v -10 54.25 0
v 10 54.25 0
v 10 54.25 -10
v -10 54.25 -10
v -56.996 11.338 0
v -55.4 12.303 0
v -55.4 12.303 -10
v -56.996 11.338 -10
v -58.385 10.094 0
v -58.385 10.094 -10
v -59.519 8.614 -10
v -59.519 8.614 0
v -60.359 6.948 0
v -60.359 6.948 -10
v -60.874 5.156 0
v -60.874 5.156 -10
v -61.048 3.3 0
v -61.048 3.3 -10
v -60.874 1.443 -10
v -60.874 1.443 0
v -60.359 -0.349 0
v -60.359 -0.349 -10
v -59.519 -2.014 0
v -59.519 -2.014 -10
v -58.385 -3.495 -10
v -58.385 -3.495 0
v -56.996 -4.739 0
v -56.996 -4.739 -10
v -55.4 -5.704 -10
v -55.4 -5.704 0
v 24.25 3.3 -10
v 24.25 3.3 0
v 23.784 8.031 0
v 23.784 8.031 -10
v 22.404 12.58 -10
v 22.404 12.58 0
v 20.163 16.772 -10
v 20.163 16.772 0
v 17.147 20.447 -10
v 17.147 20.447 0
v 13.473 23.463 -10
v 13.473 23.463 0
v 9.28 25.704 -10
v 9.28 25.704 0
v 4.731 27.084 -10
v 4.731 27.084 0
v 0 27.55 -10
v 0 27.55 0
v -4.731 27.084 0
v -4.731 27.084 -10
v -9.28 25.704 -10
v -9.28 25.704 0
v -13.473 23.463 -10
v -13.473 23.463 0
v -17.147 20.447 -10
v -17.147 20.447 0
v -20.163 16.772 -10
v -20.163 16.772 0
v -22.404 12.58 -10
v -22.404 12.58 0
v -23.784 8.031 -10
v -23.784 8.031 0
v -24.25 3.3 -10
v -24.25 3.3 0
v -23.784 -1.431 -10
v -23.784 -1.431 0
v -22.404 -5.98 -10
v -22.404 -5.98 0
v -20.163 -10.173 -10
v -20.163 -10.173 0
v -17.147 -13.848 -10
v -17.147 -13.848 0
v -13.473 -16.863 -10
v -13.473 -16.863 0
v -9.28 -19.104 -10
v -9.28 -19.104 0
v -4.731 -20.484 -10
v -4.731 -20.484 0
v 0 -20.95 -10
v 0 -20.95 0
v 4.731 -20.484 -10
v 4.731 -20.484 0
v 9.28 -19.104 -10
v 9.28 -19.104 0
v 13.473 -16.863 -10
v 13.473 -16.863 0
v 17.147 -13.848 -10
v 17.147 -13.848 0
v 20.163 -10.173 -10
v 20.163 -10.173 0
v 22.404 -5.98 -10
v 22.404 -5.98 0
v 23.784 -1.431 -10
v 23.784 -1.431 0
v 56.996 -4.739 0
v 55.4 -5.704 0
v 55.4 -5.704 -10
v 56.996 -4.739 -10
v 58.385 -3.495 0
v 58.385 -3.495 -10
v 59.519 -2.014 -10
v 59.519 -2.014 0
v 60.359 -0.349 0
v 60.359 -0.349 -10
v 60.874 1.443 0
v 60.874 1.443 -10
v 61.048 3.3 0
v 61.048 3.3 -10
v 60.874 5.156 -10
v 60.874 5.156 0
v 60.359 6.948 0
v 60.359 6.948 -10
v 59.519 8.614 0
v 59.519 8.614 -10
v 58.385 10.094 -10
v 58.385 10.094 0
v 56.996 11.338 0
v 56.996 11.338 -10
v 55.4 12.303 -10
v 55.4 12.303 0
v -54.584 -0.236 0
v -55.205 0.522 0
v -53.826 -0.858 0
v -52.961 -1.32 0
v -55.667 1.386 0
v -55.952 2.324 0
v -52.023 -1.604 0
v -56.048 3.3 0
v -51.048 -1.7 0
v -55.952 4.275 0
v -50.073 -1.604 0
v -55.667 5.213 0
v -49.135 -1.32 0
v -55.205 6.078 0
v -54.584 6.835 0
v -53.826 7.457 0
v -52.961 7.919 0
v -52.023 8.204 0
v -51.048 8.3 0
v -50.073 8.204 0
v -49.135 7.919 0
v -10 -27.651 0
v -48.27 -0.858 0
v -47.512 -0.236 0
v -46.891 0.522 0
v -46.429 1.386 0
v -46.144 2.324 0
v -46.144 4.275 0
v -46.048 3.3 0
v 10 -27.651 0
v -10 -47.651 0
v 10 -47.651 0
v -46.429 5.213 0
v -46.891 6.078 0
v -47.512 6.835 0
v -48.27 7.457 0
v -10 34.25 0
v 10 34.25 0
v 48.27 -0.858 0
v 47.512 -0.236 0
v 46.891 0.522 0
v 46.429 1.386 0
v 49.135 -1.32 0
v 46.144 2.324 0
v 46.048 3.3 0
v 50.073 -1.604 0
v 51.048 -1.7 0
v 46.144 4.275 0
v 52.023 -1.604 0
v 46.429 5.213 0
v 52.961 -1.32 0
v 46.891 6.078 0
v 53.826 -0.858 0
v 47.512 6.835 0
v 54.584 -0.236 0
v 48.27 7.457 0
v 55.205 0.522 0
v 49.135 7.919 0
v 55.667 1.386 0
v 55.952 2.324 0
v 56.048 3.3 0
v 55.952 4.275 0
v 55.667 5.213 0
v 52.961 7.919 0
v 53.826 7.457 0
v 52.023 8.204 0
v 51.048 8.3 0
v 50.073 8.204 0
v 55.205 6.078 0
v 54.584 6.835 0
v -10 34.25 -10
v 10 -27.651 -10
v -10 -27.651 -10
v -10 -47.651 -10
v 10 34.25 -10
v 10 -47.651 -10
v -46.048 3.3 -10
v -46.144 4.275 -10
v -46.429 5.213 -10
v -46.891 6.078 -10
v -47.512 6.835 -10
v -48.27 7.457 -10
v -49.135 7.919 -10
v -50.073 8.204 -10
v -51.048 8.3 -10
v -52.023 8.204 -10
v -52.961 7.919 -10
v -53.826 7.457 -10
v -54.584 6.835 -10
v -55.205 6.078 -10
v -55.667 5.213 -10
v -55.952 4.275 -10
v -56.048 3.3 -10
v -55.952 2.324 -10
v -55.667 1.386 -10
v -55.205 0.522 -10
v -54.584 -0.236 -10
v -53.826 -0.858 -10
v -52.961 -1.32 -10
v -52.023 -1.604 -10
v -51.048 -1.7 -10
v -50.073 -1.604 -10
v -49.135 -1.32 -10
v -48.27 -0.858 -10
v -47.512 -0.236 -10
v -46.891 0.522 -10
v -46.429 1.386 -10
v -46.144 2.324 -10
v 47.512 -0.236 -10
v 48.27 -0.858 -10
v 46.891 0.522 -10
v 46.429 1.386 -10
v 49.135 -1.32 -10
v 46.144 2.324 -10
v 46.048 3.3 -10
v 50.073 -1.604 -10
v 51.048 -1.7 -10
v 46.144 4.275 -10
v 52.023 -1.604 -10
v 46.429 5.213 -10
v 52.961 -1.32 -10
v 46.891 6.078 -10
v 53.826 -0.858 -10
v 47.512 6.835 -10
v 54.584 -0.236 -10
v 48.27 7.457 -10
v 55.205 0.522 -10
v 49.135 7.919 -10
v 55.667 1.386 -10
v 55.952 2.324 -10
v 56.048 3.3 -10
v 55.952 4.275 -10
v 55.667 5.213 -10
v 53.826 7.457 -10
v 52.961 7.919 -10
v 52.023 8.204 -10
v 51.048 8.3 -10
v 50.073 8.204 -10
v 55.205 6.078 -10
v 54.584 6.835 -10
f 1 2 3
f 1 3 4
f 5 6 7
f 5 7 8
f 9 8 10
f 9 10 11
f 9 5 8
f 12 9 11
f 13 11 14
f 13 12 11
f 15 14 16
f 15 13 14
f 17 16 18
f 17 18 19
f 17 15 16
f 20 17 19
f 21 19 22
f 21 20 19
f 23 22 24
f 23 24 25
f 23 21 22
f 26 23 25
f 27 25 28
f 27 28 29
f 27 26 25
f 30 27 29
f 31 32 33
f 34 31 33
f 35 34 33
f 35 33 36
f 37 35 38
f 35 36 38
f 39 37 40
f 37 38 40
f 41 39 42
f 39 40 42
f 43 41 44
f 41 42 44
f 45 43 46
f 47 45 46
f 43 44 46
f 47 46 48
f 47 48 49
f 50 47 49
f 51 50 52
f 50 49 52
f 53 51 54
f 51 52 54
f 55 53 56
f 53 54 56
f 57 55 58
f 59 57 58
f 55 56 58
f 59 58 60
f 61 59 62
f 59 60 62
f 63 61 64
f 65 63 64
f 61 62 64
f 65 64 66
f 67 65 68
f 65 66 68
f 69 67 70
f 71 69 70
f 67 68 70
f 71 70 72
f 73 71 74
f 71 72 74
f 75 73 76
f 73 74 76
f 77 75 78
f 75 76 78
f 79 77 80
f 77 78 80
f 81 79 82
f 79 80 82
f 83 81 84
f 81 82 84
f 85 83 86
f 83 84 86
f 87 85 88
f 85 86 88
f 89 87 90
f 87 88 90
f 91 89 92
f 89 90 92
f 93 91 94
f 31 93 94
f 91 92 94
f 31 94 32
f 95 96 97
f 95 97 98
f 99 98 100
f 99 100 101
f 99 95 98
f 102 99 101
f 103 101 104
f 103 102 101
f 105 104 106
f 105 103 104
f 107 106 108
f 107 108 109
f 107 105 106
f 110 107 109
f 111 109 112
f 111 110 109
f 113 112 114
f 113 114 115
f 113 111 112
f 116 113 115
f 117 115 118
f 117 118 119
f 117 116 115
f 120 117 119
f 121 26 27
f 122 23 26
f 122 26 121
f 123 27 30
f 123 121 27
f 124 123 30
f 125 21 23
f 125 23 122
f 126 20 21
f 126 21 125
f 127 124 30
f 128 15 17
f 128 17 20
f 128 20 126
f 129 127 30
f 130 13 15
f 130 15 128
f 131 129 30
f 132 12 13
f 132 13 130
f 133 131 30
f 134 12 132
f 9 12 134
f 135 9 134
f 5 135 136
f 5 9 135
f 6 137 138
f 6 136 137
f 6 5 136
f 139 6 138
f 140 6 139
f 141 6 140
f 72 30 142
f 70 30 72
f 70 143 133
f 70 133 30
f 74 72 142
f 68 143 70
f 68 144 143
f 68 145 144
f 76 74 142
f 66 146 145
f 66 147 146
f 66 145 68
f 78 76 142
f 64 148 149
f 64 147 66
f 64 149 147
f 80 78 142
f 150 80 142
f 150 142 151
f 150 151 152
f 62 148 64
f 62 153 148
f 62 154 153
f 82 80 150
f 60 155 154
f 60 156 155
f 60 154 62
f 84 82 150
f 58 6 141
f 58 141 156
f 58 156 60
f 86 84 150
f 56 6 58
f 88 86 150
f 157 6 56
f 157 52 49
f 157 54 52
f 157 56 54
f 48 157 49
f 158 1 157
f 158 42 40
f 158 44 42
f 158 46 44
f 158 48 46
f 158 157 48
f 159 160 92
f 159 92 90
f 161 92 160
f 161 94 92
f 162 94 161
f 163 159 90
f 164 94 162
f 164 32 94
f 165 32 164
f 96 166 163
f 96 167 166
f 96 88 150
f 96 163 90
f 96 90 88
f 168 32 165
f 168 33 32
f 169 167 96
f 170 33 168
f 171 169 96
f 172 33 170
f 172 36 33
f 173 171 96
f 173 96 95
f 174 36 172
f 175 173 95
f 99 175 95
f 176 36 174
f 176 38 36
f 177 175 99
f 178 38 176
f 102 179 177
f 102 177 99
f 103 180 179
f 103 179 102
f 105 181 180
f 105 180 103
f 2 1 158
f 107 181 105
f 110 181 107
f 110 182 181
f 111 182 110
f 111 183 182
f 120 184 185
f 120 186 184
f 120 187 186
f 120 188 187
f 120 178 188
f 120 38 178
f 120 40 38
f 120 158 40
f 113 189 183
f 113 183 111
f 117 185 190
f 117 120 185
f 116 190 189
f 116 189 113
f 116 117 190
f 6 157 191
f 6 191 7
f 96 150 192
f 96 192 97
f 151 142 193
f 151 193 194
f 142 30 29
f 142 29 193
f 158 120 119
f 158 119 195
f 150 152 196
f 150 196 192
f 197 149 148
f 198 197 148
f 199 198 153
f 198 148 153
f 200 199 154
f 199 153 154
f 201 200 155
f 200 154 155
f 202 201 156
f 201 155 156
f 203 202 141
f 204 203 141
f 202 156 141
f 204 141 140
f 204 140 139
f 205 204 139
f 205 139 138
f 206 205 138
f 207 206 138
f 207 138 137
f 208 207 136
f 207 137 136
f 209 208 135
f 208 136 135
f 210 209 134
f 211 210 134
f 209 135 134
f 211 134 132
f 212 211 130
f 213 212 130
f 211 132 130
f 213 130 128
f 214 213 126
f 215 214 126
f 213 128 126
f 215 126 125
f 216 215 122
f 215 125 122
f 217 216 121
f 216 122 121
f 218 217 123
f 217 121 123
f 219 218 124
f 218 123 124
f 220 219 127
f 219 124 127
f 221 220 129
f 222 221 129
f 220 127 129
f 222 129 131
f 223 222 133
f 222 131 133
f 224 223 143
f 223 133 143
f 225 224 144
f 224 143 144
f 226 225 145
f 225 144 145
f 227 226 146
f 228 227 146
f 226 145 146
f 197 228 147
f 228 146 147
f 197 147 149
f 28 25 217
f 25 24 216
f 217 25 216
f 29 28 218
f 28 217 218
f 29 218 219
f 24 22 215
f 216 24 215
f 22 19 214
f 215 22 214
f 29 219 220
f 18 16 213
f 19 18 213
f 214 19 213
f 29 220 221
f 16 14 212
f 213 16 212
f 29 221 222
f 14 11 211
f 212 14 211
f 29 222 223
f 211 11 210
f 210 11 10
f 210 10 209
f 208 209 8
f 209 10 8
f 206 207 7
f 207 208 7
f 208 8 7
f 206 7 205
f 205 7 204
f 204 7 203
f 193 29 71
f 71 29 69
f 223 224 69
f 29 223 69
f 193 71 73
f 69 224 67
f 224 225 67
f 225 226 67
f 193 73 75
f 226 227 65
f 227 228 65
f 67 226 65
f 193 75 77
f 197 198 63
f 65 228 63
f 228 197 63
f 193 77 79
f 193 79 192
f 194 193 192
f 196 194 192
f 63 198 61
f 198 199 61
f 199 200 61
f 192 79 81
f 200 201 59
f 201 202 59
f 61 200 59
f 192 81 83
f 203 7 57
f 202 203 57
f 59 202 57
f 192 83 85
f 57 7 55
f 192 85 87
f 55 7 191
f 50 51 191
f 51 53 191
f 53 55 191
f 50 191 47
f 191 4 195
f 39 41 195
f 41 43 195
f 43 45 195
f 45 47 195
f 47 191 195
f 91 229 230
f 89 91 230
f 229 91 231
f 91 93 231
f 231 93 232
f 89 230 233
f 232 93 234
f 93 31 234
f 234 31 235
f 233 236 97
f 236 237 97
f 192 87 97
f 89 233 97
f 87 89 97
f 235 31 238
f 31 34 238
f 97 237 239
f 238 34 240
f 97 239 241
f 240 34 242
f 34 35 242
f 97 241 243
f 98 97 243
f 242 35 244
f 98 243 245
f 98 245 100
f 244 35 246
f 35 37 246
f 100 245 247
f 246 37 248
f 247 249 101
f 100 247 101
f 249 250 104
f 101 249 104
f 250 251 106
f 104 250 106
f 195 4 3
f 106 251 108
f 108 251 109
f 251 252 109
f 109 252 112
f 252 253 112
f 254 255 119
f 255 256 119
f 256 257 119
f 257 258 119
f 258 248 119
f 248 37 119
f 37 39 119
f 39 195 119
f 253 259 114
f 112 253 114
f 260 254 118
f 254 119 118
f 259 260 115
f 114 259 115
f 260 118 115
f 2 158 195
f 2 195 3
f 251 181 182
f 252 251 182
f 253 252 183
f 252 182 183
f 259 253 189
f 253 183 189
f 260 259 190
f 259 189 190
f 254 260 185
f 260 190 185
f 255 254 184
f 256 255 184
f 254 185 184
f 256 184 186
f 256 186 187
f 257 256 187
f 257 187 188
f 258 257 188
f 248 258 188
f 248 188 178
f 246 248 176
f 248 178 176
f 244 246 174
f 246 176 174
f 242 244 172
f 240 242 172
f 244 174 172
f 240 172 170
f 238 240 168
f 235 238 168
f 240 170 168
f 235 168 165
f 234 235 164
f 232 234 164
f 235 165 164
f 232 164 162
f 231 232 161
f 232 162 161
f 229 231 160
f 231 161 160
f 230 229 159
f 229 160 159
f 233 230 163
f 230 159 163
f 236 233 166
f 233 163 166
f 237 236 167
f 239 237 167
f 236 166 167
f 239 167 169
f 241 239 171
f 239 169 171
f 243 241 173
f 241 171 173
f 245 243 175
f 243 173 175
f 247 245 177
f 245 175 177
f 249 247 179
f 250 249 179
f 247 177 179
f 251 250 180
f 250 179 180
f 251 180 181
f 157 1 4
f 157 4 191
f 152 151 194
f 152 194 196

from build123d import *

# Parameters (mm, degrees)
SKETCH1_R           = 24.25
SKETCH1_R_2         = 5
BOSS_EXTRUDE1_DEPTH = 10


with BuildPart() as part:
    # Sketch1 → Boss-Extrude1 (new body)
    with BuildSketch(Plane.XY):
        with BuildLine():
            Line((10, 54.25), (-10, 54.25))
            Line((-10, 54.25), (-10, 34.25))
            Line((-10, 34.25), (-55.400247003, 12.302884399))
            ThreePointArc((-55.400247003, 12.302884399), (-61.047971586, 3.299679487), (-55.400247003, -5.703525425))
            Line((-55.400247003, -5.703525425), (-10, -27.650641026))
            Line((-10, -27.650641026), (-10, -47.650641026))
            Line((-10, -47.650641026), (10, -47.650641026))
            Line((10, -47.650641026), (10, -27.650641026))
            Line((10, -27.650641026), (55.400247003, -5.703525425))
            ThreePointArc((55.400247003, -5.703525425), (61.047971586, 3.299679487), (55.400247003, 12.302884399))
            Line((55.400247003, 12.302884399), (10, 34.25))
            Line((10, 34.25), (10, 54.25))
        make_face()
        with Locations((0, 3.299679487)):
            Circle(SKETCH1_R, mode=Mode.SUBTRACT)
        with Locations((51.047971586, 3.299679487)):
            Circle(SKETCH1_R_2, mode=Mode.SUBTRACT)
        with Locations((-51.047971586, 3.299679487)):
            Circle(SKETCH1_R_2, mode=Mode.SUBTRACT)
    extrude(amount=-BOSS_EXTRUDE1_DEPTH)


solid = part.part
